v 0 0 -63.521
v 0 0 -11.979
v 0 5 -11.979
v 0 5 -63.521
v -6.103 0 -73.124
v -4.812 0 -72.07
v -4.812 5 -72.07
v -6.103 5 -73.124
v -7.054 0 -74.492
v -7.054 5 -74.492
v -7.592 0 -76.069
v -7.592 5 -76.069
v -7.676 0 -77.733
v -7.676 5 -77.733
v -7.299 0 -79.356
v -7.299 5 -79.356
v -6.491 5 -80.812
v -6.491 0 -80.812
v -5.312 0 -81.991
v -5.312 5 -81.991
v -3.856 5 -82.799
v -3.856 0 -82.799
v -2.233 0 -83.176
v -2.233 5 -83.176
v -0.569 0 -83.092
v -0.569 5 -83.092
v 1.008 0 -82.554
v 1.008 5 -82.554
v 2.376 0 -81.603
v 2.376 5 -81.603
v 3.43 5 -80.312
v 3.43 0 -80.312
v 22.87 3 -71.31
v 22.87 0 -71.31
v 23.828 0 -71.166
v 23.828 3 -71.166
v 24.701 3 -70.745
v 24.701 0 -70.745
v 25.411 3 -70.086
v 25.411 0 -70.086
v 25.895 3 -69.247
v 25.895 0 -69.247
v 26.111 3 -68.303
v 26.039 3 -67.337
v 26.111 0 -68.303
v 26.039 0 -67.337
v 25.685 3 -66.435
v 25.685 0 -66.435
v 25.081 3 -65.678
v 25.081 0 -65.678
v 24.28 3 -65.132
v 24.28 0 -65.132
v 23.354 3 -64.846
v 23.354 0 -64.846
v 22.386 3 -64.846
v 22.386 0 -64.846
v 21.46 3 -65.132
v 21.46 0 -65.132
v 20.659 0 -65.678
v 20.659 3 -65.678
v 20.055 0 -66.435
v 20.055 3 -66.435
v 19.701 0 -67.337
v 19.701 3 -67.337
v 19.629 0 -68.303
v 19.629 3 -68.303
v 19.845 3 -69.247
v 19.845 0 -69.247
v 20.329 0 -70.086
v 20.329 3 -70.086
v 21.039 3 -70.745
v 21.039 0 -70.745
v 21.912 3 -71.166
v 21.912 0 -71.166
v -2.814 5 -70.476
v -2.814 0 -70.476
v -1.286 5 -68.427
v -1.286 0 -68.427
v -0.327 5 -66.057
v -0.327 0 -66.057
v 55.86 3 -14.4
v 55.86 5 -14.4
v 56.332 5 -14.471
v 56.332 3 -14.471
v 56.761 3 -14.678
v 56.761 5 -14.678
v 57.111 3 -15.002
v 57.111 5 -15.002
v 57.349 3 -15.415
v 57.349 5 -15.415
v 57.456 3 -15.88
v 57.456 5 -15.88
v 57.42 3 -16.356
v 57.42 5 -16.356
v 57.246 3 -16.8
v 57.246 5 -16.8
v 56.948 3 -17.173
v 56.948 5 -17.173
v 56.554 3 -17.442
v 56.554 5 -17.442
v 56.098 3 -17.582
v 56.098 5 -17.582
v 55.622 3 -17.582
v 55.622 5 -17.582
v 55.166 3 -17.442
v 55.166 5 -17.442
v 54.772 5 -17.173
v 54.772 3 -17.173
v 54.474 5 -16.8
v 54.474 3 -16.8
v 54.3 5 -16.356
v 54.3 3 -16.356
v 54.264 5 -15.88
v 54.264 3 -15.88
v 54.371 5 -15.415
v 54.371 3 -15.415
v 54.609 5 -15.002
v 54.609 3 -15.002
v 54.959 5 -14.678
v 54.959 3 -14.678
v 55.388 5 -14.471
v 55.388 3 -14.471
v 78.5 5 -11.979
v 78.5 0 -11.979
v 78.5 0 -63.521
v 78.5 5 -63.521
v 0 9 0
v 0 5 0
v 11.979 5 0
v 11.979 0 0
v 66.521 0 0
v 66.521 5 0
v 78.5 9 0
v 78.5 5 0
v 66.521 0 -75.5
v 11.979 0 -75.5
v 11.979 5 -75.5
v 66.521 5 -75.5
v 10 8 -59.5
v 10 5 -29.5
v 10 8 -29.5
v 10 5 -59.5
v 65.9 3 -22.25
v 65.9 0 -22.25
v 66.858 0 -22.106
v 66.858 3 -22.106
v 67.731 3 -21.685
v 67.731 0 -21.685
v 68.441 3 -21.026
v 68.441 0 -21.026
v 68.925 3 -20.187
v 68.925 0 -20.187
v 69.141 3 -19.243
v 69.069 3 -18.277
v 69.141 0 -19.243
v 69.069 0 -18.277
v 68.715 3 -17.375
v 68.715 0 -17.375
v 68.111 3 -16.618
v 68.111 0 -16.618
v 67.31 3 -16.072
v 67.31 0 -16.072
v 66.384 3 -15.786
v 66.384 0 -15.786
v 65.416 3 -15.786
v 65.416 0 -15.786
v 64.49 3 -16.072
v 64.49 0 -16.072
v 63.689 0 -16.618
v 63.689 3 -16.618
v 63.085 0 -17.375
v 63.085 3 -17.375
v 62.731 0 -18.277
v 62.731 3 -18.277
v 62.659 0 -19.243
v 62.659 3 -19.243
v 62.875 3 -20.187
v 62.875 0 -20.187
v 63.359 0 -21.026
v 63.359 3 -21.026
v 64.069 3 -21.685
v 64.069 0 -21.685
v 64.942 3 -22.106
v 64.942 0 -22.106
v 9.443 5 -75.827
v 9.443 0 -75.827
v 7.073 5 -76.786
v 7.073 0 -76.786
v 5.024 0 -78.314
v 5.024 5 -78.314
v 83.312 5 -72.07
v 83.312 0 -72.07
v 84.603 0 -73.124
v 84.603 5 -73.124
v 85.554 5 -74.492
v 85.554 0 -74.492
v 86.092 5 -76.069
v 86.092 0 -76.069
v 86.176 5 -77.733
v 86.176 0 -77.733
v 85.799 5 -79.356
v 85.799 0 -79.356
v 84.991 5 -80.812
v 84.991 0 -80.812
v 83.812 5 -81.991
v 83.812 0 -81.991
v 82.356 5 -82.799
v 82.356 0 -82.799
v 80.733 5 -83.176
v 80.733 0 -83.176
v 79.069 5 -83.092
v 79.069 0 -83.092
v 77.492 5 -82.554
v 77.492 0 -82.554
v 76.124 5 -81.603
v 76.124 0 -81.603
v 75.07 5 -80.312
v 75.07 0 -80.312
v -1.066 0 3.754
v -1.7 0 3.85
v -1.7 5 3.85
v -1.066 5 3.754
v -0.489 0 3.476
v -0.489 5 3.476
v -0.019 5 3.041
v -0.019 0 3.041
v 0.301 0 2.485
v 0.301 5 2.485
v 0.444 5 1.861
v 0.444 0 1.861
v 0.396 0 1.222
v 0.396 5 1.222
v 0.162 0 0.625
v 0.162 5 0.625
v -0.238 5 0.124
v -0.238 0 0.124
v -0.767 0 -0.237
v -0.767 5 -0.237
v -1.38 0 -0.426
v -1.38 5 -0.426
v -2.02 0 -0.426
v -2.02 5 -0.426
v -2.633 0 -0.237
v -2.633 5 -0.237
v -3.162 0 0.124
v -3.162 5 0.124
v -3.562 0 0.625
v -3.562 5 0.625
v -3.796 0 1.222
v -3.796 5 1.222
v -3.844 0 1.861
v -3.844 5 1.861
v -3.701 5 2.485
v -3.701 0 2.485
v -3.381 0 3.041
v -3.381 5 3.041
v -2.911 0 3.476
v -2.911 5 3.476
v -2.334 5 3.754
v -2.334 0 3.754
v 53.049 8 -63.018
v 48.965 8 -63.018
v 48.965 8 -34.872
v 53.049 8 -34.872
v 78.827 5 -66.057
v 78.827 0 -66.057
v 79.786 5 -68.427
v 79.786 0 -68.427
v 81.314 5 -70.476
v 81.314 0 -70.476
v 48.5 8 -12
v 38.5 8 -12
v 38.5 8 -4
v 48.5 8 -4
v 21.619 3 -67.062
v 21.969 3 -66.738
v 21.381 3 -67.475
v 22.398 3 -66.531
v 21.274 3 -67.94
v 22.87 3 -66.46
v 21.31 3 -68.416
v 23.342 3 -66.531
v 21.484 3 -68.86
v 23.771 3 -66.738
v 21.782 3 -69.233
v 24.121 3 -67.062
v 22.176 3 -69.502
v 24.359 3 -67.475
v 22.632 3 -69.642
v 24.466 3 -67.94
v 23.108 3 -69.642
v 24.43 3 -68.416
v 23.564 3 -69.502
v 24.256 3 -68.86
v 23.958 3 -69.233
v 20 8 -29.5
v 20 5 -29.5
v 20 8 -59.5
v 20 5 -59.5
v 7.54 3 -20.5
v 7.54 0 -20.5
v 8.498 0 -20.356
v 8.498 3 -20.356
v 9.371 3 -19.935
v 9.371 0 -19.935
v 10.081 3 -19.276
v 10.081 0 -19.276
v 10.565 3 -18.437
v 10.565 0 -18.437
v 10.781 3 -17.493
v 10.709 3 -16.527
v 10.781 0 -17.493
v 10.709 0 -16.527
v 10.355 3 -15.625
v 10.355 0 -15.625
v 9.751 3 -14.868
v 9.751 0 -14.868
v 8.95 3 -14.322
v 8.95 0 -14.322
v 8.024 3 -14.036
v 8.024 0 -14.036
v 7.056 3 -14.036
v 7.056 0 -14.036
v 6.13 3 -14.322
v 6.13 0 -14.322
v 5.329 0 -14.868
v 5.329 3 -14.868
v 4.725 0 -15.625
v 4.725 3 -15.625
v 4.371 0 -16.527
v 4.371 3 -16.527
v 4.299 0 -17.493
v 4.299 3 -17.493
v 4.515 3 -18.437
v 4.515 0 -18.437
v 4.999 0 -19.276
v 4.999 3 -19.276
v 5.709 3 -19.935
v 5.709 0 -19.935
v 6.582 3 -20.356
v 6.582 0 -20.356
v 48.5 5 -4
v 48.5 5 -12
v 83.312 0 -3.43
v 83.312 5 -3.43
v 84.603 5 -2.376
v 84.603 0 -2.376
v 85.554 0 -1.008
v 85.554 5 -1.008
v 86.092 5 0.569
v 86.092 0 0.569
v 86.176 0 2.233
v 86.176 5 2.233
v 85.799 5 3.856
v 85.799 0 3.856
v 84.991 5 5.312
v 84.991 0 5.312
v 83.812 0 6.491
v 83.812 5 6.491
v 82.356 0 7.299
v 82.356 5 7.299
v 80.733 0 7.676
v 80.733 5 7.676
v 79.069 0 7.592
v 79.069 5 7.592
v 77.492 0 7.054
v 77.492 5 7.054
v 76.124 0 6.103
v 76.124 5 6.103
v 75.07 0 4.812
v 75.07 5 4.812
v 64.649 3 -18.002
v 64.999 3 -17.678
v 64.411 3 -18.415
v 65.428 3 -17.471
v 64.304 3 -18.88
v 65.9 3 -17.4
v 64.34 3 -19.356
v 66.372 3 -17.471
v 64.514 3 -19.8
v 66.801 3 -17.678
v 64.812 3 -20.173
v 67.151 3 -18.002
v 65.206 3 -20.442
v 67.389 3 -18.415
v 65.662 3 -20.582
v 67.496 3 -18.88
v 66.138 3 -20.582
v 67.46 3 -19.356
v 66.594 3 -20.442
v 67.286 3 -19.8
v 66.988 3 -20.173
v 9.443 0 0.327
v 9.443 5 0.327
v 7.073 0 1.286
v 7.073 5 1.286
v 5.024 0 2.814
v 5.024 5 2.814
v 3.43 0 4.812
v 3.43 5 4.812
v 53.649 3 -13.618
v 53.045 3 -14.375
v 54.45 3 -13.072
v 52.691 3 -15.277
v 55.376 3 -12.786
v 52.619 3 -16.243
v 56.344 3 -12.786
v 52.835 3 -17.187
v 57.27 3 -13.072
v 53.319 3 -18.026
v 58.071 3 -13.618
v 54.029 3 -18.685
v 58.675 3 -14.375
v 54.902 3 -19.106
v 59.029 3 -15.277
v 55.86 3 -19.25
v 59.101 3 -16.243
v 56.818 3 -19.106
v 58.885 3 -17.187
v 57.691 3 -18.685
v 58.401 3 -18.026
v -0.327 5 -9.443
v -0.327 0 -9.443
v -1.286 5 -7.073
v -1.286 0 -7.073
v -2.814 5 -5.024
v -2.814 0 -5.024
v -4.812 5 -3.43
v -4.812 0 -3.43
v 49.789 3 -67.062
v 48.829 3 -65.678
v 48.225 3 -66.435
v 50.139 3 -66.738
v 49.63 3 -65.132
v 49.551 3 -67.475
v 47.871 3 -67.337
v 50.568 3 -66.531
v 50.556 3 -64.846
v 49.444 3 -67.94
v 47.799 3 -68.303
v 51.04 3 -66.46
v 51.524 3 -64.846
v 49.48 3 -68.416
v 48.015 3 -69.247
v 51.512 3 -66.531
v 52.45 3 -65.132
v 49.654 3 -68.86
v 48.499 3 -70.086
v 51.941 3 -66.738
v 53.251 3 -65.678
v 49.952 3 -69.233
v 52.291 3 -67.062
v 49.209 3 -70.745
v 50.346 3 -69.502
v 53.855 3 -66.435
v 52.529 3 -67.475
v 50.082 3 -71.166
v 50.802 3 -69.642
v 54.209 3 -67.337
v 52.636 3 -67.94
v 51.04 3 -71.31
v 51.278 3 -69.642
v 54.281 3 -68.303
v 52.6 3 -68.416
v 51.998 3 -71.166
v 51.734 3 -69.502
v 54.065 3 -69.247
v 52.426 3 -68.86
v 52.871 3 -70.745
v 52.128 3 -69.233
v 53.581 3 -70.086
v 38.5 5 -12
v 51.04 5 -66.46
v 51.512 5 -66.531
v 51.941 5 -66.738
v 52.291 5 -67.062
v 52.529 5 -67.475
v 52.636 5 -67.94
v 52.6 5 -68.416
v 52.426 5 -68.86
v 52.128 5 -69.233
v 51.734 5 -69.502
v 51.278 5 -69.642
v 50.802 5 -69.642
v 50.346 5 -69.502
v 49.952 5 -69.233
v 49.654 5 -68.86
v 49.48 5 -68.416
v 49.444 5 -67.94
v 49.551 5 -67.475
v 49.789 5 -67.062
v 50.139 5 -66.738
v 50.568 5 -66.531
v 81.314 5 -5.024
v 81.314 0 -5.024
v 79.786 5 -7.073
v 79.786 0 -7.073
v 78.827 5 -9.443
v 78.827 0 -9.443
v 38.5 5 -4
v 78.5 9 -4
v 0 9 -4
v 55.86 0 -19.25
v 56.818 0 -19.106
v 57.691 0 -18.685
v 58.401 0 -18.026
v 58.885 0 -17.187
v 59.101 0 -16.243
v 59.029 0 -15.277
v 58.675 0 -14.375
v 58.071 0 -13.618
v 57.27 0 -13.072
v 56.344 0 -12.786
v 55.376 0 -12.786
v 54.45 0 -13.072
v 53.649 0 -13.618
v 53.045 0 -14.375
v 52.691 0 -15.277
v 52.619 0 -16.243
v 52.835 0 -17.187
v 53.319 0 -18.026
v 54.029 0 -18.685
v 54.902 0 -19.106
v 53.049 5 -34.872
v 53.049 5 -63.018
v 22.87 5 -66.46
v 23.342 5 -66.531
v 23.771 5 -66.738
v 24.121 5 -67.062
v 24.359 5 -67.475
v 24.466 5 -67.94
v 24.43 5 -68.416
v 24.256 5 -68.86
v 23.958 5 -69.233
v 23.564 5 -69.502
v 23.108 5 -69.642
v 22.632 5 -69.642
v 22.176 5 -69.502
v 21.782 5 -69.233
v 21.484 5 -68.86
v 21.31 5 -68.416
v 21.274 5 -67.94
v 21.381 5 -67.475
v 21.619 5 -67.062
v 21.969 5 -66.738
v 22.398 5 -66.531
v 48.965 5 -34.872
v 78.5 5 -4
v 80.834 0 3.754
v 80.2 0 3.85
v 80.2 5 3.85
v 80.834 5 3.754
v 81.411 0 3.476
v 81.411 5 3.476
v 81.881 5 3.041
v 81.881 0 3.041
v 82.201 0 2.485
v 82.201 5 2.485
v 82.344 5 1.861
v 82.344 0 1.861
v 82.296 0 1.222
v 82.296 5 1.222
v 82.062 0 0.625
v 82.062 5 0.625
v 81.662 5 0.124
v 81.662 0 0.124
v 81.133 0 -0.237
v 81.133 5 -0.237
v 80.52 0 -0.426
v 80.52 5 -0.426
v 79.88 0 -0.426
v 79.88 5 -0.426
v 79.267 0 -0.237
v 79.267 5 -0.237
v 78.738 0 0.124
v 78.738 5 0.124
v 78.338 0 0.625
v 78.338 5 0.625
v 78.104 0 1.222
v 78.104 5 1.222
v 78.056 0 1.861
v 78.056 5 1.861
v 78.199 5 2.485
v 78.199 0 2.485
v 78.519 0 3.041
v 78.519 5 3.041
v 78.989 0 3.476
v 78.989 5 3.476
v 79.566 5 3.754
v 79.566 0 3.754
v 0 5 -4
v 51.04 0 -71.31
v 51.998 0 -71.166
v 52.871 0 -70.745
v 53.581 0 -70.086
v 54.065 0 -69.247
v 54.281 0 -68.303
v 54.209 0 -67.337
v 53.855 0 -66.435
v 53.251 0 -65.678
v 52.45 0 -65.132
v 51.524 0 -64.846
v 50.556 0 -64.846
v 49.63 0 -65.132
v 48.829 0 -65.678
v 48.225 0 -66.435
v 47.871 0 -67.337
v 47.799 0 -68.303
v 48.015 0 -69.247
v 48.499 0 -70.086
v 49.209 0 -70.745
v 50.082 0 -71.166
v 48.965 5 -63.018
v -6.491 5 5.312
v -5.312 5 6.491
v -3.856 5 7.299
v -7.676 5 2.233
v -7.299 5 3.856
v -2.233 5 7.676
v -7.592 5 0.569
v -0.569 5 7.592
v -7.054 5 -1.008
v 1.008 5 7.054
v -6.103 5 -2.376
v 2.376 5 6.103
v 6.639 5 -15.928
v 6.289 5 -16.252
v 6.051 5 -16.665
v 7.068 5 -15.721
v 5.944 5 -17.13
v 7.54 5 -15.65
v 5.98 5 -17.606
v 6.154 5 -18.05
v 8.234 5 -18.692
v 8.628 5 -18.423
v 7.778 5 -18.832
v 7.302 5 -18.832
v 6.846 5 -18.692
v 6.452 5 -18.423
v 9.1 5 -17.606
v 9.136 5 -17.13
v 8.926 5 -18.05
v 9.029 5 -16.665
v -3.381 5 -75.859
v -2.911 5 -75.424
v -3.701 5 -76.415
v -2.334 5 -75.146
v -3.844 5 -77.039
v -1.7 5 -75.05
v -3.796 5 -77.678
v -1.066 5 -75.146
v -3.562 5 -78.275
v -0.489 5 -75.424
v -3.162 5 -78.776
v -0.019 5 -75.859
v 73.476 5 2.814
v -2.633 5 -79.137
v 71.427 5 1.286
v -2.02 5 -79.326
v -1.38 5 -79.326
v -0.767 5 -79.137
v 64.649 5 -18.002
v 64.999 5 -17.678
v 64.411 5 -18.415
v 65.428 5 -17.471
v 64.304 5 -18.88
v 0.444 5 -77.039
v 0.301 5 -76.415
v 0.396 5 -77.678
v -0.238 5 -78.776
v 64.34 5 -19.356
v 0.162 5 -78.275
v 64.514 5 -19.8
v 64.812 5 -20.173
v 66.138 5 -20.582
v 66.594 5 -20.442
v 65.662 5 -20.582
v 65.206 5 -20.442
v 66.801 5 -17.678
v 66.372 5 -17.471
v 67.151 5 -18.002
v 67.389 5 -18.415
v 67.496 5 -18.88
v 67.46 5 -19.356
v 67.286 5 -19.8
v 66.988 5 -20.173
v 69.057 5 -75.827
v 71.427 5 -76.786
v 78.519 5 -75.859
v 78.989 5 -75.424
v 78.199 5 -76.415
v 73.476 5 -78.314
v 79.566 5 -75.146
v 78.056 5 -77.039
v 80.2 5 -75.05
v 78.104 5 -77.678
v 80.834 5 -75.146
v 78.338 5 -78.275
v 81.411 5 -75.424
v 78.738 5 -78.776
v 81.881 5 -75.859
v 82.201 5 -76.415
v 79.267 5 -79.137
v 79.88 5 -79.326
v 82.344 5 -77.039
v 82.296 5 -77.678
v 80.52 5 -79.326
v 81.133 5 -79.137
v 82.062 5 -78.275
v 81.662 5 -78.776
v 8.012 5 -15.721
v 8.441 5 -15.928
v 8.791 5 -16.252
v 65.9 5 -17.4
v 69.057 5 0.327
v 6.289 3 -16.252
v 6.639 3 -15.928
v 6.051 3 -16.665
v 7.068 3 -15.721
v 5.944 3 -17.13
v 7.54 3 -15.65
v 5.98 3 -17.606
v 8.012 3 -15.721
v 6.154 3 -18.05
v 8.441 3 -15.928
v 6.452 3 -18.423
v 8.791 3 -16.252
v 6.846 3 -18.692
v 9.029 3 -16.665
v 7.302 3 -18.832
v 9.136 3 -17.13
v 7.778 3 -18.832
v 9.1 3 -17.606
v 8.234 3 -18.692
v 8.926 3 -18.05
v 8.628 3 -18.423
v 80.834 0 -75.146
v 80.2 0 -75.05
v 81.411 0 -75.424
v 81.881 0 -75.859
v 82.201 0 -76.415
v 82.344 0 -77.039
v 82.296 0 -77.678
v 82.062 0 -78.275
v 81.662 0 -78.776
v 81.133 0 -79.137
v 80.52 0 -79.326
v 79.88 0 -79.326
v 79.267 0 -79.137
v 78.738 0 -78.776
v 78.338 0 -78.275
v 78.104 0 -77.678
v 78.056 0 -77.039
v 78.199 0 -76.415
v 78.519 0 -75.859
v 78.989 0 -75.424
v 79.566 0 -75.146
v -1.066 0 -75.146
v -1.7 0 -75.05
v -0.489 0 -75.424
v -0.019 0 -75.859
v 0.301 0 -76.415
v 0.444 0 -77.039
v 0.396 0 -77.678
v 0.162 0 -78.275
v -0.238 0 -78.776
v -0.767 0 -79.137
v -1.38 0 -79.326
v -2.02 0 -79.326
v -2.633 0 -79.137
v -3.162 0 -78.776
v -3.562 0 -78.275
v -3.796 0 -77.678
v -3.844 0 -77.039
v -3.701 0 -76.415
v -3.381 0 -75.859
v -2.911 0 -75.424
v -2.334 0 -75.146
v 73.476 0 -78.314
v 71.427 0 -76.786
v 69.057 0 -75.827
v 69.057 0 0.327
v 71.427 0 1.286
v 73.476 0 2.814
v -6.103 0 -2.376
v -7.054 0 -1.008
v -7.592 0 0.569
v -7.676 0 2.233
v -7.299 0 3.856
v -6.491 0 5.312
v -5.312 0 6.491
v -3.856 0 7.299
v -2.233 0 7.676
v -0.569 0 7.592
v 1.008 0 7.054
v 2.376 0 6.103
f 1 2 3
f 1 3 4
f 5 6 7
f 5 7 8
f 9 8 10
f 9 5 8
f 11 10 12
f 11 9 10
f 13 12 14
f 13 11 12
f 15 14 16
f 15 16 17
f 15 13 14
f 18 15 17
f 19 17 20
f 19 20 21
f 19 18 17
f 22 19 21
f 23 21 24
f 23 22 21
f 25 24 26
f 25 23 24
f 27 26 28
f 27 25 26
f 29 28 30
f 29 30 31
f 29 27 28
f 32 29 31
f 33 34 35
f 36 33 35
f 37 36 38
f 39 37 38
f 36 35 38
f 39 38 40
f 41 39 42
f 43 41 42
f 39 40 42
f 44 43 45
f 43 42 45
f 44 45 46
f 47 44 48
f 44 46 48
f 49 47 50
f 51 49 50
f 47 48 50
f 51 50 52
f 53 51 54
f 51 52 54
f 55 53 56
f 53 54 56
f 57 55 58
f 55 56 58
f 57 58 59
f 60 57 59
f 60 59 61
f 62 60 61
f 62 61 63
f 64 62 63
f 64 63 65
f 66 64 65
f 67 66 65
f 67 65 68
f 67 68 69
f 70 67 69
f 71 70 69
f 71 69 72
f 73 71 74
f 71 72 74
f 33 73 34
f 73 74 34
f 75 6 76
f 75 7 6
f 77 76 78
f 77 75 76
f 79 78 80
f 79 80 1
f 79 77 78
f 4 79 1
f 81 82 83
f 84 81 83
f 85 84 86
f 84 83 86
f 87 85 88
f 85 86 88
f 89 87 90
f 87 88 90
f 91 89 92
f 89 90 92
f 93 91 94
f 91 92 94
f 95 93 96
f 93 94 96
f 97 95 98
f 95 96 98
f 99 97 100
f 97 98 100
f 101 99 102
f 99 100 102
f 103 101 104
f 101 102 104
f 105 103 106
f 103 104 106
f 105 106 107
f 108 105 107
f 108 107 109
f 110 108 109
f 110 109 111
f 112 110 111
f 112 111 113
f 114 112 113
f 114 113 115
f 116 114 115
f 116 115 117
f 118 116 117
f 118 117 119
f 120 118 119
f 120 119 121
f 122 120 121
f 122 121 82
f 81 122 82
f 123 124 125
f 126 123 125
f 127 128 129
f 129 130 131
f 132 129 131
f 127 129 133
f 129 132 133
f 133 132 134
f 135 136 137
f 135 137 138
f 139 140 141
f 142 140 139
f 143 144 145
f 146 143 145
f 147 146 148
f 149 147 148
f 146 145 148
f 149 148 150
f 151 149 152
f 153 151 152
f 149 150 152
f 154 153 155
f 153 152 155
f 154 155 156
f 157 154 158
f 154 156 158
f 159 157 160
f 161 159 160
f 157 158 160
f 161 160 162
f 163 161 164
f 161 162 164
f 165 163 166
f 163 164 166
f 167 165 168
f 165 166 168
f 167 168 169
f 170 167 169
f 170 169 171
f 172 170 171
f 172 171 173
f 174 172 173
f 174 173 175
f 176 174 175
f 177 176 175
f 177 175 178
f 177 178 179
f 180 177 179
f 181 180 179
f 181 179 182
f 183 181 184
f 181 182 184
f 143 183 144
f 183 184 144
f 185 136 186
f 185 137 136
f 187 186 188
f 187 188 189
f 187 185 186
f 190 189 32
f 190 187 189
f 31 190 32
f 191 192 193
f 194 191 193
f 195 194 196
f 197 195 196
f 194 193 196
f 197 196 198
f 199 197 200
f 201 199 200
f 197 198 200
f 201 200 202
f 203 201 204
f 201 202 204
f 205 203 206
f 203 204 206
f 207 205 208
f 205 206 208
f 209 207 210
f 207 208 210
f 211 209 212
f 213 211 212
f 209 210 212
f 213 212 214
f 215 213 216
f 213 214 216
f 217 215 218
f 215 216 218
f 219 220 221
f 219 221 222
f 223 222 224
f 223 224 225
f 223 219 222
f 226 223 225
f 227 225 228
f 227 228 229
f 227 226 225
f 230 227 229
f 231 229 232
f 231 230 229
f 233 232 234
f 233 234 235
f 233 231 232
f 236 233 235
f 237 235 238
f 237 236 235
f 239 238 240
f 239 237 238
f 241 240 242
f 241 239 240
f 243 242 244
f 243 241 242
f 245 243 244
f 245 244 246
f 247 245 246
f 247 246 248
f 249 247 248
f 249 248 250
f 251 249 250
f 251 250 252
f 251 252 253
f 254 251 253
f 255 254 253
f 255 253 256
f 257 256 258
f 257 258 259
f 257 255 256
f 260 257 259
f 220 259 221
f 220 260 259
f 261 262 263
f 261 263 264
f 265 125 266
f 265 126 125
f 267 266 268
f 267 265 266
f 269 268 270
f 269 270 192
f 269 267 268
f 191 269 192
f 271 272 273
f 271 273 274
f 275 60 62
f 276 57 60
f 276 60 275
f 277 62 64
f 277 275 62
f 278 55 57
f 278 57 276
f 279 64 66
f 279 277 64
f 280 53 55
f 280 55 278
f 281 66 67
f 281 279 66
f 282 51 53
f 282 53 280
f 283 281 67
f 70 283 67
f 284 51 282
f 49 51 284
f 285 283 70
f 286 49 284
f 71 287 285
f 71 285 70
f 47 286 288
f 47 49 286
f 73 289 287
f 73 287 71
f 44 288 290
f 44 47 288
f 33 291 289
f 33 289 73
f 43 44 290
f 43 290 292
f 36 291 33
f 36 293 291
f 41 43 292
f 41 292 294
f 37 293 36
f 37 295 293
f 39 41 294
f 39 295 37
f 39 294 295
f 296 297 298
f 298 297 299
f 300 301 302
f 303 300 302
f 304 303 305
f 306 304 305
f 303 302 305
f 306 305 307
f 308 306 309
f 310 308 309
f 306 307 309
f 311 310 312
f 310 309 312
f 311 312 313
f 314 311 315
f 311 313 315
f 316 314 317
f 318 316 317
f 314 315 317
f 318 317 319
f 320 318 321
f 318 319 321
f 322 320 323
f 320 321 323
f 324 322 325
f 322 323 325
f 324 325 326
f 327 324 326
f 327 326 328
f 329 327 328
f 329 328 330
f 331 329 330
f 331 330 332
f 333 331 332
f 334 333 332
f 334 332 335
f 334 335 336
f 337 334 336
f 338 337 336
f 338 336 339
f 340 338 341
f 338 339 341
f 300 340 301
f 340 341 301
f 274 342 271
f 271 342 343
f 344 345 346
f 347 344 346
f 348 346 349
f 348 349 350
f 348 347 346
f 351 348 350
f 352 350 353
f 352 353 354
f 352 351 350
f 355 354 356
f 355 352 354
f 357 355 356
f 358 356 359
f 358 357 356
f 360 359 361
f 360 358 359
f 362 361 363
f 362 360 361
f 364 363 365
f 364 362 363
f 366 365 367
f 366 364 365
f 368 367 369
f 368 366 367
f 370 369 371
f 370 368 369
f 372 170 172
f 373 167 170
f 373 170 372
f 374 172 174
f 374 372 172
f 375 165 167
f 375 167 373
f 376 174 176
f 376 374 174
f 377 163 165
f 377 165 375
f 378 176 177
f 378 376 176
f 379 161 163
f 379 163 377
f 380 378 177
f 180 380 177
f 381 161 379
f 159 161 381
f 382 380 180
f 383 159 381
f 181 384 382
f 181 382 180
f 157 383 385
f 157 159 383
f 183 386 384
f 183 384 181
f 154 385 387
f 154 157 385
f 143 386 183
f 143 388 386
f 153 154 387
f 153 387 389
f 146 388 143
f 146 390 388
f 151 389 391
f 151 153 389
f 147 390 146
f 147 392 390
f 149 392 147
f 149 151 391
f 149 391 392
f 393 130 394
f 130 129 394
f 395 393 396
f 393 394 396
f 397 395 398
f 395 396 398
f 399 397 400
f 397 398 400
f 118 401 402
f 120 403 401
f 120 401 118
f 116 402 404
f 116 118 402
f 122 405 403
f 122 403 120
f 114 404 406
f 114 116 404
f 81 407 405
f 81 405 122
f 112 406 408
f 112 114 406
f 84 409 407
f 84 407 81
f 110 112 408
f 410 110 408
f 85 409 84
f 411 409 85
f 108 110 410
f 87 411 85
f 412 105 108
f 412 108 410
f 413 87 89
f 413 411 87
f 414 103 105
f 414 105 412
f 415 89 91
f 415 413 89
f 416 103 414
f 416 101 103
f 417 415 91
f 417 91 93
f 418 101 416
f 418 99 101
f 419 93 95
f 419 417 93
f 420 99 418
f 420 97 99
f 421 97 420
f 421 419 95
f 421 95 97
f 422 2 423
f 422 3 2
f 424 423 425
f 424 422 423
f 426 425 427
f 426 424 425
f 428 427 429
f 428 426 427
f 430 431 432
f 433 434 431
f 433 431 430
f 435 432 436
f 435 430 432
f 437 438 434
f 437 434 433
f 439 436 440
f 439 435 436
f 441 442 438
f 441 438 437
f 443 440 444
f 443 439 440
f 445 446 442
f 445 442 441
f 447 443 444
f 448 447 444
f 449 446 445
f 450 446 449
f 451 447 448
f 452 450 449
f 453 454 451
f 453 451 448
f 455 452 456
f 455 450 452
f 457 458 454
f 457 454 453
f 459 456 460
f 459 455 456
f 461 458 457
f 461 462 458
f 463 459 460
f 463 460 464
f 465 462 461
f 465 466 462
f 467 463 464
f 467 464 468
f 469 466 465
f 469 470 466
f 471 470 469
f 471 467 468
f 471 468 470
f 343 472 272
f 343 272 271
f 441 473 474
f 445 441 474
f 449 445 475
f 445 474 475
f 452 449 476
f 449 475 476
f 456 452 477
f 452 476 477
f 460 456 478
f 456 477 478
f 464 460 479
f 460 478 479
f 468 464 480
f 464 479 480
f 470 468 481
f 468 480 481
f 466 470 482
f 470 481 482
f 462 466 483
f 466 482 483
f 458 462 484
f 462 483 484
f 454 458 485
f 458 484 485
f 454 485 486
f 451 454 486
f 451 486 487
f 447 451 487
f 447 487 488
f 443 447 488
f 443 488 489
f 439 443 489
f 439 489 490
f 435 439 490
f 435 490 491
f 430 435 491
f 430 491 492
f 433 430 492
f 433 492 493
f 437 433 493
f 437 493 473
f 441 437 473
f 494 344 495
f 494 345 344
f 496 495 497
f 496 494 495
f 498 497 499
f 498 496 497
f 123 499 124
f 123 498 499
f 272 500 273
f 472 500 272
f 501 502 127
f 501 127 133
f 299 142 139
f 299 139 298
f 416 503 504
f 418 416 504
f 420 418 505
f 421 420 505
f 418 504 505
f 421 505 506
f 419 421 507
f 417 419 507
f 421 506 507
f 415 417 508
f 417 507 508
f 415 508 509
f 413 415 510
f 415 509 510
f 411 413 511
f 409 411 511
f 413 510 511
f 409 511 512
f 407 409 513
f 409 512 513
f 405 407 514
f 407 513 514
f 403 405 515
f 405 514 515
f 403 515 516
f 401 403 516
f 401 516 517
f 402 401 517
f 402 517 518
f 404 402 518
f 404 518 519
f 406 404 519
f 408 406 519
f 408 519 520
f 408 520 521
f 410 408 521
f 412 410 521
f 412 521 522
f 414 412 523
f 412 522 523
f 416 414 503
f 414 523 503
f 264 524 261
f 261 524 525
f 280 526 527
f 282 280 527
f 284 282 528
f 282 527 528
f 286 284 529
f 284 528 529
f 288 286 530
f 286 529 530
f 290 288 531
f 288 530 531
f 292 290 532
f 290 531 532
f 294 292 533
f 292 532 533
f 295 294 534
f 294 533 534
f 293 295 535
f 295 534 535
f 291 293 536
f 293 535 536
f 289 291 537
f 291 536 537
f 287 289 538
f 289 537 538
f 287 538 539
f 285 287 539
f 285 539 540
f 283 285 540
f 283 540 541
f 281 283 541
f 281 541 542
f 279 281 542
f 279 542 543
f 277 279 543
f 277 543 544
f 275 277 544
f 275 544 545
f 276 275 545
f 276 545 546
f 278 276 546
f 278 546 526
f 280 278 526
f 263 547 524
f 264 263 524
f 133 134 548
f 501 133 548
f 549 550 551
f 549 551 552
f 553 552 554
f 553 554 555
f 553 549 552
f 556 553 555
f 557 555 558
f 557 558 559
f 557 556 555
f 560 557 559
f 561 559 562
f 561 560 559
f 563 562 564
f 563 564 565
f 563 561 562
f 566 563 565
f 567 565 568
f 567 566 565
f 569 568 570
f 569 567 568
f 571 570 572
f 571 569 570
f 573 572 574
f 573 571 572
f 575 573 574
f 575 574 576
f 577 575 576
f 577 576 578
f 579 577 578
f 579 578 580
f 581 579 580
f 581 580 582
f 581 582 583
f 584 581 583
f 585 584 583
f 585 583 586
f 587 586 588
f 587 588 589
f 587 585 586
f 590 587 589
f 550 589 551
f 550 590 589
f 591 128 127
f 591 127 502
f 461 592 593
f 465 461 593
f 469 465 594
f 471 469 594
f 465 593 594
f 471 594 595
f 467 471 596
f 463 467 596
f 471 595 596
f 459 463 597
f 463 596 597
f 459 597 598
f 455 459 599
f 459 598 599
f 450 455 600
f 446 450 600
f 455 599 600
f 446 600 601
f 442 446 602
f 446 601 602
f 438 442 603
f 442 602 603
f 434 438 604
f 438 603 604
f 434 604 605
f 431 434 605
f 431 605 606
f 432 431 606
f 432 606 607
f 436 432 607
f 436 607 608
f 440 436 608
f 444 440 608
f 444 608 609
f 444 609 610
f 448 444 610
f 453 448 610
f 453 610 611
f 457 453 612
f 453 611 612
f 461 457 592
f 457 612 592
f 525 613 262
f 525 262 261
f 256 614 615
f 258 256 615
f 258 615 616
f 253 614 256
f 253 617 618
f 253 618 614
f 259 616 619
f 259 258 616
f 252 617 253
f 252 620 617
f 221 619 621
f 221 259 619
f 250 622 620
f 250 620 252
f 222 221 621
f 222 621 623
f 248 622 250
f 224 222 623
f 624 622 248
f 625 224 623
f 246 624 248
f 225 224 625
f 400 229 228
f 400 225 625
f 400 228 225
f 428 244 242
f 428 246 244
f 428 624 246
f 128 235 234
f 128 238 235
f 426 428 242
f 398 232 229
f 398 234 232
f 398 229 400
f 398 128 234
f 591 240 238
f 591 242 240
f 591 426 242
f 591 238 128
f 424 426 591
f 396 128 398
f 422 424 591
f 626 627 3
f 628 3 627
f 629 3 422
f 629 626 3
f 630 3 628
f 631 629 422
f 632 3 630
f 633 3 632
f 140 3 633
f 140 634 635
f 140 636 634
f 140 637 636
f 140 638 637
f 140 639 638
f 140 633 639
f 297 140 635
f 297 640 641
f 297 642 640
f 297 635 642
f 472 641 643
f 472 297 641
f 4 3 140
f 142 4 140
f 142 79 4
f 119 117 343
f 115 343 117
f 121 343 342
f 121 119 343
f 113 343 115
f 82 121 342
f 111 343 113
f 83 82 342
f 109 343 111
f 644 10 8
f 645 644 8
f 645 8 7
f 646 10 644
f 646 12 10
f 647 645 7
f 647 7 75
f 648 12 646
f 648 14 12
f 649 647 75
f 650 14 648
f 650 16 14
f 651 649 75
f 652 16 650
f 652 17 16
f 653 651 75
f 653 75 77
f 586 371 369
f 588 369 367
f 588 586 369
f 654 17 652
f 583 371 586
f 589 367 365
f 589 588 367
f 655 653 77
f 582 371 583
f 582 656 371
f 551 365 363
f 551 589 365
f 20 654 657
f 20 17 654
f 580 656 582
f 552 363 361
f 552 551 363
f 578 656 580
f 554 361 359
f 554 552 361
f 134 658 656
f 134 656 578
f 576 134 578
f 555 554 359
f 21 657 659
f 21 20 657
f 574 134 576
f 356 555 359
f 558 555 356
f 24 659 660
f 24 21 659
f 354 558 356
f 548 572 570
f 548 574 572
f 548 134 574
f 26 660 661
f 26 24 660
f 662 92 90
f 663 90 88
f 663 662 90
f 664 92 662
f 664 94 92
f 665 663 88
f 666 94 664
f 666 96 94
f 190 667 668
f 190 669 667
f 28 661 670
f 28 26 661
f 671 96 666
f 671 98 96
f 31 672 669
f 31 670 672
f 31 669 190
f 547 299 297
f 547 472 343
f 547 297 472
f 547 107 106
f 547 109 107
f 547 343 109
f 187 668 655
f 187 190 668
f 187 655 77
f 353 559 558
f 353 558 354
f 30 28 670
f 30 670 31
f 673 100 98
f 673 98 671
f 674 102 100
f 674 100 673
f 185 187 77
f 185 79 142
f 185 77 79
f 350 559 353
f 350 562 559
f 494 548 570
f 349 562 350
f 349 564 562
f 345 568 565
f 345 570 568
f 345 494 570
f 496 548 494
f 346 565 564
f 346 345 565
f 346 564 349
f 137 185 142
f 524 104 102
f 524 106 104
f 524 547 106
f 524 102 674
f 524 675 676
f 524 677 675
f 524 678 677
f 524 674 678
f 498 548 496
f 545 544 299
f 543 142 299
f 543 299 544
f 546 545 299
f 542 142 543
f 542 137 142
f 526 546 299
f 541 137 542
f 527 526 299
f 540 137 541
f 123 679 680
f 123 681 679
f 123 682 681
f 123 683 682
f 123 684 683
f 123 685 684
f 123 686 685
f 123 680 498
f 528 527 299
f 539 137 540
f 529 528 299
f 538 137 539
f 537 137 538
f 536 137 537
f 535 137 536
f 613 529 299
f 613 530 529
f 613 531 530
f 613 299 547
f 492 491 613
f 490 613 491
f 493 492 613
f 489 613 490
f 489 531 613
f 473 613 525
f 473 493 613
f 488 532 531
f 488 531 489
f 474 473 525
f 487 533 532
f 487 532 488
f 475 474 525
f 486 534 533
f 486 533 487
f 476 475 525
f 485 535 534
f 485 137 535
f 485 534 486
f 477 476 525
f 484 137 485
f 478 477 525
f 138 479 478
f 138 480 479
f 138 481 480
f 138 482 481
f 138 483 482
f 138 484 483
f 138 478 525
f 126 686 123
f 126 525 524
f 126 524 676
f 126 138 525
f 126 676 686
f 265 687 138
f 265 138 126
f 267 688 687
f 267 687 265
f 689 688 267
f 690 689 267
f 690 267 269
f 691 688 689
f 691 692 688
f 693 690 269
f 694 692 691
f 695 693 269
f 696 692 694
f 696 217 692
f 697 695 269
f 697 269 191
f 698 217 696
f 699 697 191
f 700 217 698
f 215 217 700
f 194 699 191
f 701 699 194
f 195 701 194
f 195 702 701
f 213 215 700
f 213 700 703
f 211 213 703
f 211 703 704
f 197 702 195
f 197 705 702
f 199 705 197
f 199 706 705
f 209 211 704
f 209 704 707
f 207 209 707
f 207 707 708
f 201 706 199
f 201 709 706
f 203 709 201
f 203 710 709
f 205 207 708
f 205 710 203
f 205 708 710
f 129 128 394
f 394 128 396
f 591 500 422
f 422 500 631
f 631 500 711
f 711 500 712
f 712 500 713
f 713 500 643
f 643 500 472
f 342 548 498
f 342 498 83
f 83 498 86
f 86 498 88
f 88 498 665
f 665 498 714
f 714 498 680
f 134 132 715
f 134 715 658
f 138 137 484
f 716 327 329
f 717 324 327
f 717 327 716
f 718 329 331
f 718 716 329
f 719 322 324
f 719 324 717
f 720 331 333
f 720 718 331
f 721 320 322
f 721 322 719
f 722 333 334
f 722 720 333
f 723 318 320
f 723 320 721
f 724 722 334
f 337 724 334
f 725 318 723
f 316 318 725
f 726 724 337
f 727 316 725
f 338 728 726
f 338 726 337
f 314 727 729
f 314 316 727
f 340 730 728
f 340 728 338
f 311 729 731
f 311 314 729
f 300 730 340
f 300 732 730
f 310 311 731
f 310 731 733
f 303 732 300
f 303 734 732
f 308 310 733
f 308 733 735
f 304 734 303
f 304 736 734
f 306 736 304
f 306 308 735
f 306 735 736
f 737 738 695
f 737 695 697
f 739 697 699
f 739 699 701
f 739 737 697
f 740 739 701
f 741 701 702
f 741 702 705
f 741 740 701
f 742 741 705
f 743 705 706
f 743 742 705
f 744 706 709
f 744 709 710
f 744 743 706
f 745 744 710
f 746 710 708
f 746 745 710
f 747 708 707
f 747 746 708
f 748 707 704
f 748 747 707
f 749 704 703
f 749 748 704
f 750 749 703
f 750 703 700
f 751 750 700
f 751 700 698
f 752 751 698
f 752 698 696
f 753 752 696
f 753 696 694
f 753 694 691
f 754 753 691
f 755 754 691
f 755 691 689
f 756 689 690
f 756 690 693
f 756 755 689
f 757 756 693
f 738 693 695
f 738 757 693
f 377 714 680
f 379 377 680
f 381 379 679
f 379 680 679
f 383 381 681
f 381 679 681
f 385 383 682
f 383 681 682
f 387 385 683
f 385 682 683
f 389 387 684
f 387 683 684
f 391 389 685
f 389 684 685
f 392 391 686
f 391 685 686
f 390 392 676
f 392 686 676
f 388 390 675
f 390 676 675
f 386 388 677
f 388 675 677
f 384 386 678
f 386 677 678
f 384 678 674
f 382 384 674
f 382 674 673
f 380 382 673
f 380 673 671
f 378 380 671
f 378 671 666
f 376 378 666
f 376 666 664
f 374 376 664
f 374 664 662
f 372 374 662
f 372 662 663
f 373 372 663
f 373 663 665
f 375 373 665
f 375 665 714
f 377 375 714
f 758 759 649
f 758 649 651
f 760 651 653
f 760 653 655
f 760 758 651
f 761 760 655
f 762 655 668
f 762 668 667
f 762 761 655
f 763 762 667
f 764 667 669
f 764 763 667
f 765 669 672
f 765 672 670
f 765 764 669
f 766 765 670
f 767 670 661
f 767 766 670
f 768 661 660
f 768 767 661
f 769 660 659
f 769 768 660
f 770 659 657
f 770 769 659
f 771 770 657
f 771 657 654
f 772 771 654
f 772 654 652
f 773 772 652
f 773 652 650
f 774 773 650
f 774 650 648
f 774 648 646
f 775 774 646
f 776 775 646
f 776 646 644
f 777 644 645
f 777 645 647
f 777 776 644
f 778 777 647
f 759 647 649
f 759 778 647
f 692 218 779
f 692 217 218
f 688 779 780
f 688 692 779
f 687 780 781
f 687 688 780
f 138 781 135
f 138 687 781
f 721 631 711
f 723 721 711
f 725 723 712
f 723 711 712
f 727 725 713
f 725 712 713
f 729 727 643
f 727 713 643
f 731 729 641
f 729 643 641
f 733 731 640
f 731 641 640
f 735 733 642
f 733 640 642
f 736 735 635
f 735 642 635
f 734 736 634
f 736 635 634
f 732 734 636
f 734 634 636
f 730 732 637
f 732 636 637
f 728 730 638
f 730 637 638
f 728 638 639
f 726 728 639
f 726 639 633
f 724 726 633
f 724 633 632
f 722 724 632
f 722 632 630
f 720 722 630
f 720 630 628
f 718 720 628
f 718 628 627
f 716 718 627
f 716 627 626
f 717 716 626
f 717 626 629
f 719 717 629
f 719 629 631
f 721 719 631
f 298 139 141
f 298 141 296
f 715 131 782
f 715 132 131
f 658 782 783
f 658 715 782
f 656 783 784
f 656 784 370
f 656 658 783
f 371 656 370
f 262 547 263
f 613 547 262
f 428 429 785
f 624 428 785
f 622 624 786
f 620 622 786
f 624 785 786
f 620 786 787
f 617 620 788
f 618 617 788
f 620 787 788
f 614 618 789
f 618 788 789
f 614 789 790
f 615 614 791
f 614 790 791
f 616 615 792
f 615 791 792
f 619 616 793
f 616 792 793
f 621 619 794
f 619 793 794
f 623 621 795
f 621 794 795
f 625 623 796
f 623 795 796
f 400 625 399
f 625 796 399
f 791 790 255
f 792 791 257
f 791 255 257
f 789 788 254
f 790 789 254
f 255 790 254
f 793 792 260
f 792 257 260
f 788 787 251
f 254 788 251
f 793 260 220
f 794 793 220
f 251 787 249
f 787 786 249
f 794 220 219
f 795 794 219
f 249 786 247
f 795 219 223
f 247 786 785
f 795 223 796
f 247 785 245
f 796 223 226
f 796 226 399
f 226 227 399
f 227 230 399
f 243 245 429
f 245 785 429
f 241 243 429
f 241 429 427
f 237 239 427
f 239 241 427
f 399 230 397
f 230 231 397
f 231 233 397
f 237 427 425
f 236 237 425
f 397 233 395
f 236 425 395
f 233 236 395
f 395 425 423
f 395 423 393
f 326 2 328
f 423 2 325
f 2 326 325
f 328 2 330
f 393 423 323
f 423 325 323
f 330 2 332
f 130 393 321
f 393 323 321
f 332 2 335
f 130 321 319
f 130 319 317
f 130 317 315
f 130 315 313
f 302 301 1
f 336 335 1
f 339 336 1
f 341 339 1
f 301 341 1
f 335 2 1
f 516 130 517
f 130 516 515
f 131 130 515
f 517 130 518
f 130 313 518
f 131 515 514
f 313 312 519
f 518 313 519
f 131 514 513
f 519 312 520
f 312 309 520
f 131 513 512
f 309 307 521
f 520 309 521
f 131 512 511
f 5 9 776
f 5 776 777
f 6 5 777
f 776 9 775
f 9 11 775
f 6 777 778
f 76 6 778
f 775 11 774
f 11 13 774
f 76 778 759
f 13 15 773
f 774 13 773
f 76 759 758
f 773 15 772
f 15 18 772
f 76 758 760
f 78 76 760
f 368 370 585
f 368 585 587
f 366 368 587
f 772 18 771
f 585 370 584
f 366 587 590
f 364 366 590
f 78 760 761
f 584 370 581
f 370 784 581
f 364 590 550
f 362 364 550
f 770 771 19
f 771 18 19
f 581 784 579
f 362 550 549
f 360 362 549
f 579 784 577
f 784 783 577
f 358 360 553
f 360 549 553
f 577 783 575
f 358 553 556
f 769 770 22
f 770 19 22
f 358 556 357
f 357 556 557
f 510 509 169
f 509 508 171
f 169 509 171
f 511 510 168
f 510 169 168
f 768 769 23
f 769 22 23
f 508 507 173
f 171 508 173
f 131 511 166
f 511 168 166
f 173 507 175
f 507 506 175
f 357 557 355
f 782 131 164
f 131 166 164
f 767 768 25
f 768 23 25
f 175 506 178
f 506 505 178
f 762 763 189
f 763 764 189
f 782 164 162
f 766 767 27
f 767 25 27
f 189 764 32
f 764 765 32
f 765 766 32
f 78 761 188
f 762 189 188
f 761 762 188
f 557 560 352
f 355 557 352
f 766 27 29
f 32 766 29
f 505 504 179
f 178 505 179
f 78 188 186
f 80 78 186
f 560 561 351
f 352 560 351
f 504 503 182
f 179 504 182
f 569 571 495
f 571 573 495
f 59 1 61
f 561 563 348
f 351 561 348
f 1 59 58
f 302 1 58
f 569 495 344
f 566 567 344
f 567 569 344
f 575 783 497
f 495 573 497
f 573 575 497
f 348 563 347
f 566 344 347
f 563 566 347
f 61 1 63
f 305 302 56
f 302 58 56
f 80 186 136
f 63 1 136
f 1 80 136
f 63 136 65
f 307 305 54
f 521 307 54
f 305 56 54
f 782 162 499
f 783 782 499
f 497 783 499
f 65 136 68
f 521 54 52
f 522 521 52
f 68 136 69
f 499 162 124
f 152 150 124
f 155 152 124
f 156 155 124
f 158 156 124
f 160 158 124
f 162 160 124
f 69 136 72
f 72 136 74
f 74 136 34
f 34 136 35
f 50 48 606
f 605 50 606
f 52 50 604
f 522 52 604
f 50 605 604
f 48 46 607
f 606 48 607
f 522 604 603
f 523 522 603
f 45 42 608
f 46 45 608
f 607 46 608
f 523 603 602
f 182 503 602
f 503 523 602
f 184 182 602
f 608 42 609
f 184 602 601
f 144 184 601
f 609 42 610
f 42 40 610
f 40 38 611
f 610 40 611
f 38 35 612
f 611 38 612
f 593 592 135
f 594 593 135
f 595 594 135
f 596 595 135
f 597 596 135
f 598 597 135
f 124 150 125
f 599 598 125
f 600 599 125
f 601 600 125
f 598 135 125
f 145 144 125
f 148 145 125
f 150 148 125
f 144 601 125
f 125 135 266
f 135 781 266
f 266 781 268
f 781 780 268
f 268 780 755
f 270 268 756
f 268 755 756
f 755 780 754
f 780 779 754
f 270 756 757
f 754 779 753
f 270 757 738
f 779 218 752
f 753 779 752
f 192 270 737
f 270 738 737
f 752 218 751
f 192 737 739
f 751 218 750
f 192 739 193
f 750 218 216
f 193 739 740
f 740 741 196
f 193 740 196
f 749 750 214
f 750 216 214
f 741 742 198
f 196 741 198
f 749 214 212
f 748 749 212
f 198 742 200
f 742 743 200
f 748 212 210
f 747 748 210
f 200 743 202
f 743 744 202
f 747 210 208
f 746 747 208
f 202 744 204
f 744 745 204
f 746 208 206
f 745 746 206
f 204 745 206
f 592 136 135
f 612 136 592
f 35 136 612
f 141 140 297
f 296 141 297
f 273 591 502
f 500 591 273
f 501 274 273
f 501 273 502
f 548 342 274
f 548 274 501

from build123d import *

# Parameters (mm, degrees)
SKETCH1_W           = 78.5
SKETCH1_H           = 75.5
BOSS_EXTRUDE1_DEPTH = 5
SKETCH2_W           = 10
SKETCH2_H           = 30
SKETCH2_W_2         = 4.083917928
SKETCH2_H_2         = 28.145920853
SKETCH2_H_3         = 8
BOSS_EXTRUDE2_DEPTH = 3
SKETCH6_R           = 2.15
BOSS_EXTRUDE3_DEPTH = 5
SKETCH3_R           = 1.6
CUT_EXTRUDE3_DEPTH  = 10
SKETCH5_R           = 3.25
CUT_EXTRUDE4_DEPTH  = 3
SKETCH9_W           = 78.5
SKETCH9_H           = 4
BOSS_EXTRUDE5_DEPTH = 4
FILLET2_R           = 10
FILLET3_R           = 10
FILLET4_R           = 10
FILLET5_R           = 10
FILLET6_R           = 10
FILLET7_R           = 10
FILLET8_R           = 10
FILLET9_R           = 10


with BuildPart() as part:
    # Sketch1 → Boss-Extrude1 (new body)
    with BuildSketch(Plane(origin=(0, 0, 0), x_dir=(1, 0, 0), z_dir=(0, 1, 0))):
        with Locations((39.25, 37.75)):
            Rectangle(SKETCH1_W, SKETCH1_H)
    extrude(amount=BOSS_EXTRUDE1_DEPTH)

    # Sketch2 → Boss-Extrude2 (add)
    with BuildSketch(Plane(origin=(0, 5, 0), x_dir=(1, 0, 0), z_dir=(0, 1, 0))):
        with Locations((15, 44.5)):
            Rectangle(SKETCH2_W, SKETCH2_H)
        with Locations((51.006989776, 48.944975154)):
            Rectangle(SKETCH2_W_2, SKETCH2_H_2)
        with Locations((43.5, 8)):
            Rectangle(SKETCH2_W, SKETCH2_H_3)
    extrude(amount=BOSS_EXTRUDE2_DEPTH)

    # Sketch6 → Boss-Extrude3 (add)
    # profile 1 of 4: a face of its own
    with BuildSketch(Plane(origin=(0, 0, 0), x_dir=(1, 0, 0), z_dir=(0, 1, 0))):
        with BuildLine():
            Line((0, 0), (0, 4.054128952))
            ThreePointArc((0, 4.054128952), (-5.942640687, -5.942640687), (4.054128952, 0))
            Line((4.054128952, 0), (0, 0))
        make_face()
        with Locations(Location((-1.7, -1.7, 0), (0, 0, 270))):
            Circle(SKETCH6_R, mode=Mode.SUBTRACT)
    # profile 2 of 4: a face of its own
    with BuildSketch(Plane(origin=(0, 0, 0), x_dir=(1, 0, 0), z_dir=(0, 1, 0))):
        with BuildLine():
            ThreePointArc((78.5, 4.054128952), (84.442640687, -5.942640687), (74.445871048, 0))
            Line((74.445871048, 0), (78.5, 0))
            Line((78.5, 0), (78.5, 4.054128952))
        make_face()
        with Locations(Location((80.2, -1.7, 0), (0, 0, 270))):
            Circle(SKETCH6_R, mode=Mode.SUBTRACT)
    # profile 3 of 4: a face of its own
    with BuildSketch(Plane(origin=(0, 0, 0), x_dir=(1, 0, 0), z_dir=(0, 1, 0))):
        with BuildLine():
            ThreePointArc((0, 71.445871048), (-5.942640687, 81.442640687), (4.054128952, 75.5))
            Line((4.054128952, 75.5), (0, 75.5))
            Line((0, 75.5), (0, 71.445871048))
        make_face()
        with Locations(Location((-1.7, 77.2, 0), (0, 0, 270))):
            Circle(SKETCH6_R, mode=Mode.SUBTRACT)
    # profile 4 of 4: a face of its own
    with BuildSketch(Plane(origin=(0, 0, 0), x_dir=(1, 0, 0), z_dir=(0, 1, 0))):
        with BuildLine():
            Line((78.5, 75.5), (78.5, 71.445871048))
            ThreePointArc((78.5, 71.445871048), (84.442640687, 81.442640687), (74.445871048, 75.5))
            Line((74.445871048, 75.5), (78.5, 75.5))
        make_face()
        with Locations(Location((80.2, 77.2, 0), (0, 0, 270))):
            Circle(SKETCH6_R, mode=Mode.SUBTRACT)
    extrude(amount=BOSS_EXTRUDE3_DEPTH)

    # Sketch3 → Cut-Extrude3 (cut)
    with BuildSketch(Plane(origin=(0, 5, 0), x_dir=(1, 0, 0), z_dir=(0, 1, 0))):
        with Locations(Location((7.54, 17.25, 0), (0, 0, 270))):
            Circle(SKETCH3_R)
        with Locations(Location((55.86, 16, 0), (0, 0, 270))):
            Circle(SKETCH3_R)
        with Locations(Location((22.87, 68.06, 0), (0, 0, 270))):
            Circle(SKETCH3_R)
        with Locations(Location((51.04, 68.06, 0), (0, 0, 270))):
            Circle(SKETCH3_R)
        with Locations(Location((65.9, 19, 0), (0, 0, 270))):
            Circle(SKETCH3_R)
    extrude(amount=-CUT_EXTRUDE3_DEPTH, mode=Mode.SUBTRACT)

    # Sketch5 → Cut-Extrude4 (cut)
    with BuildSketch(Plane.XZ):
        with Locations(Location((7.54, -17.25, 0), (0, 0, 270))):
            Circle(SKETCH5_R)
        with Locations(Location((55.86, -16, 0), (0, 0, 270))):
            Circle(SKETCH5_R)
        with Locations(Location((22.87, -68.06, 0), (0, 0, 270))):
            Circle(SKETCH5_R)
        with Locations(Location((51.04, -68.06, 0), (0, 0, 270))):
            Circle(SKETCH5_R)
        with Locations(Location((65.9, -19, 0), (0, 0, 270))):
            Circle(SKETCH5_R)
    extrude(amount=-CUT_EXTRUDE4_DEPTH, mode=Mode.SUBTRACT)

    # Sketch9 → Boss-Extrude5 (add)
    with BuildSketch(Plane(origin=(0, 5, 0), x_dir=(1, 0, 0), z_dir=(0, 1, 0))):
        with Locations((39.25, 2)):
            Rectangle(SKETCH9_W, SKETCH9_H)
    extrude(amount=BOSS_EXTRUDE5_DEPTH)

    # Fillet2
    fillet2_edges = [part.edges().sort_by_distance(p)[0] for p in [
        (4.054128952, 2.5, 0),
    ]]
    fillet(fillet2_edges, radius=FILLET2_R)

    # Fillet3
    fillet3_edges = [part.edges().sort_by_distance(p)[0] for p in [
        (74.445871048, 2.5, 0),
    ]]
    fillet(fillet3_edges, radius=FILLET3_R)

    # Fillet4
    fillet4_edges = [part.edges().sort_by_distance(p)[0] for p in [
        (78.5, 2.5, -4.054128952),
    ]]
    fillet(fillet4_edges, radius=FILLET4_R)

    # Fillet5
    fillet5_edges = [part.edges().sort_by_distance(p)[0] for p in [
        (78.5, 2.5, -71.445871048),
    ]]
    fillet(fillet5_edges, radius=FILLET5_R)

    # Fillet6
    fillet6_edges = [part.edges().sort_by_distance(p)[0] for p in [
        (74.445871048, 2.5, -75.5),
    ]]
    fillet(fillet6_edges, radius=FILLET6_R)

    # Fillet7
    fillet7_edges = [part.edges().sort_by_distance(p)[0] for p in [
        (4.054128952, 2.5, -75.5),
    ]]
    fillet(fillet7_edges, radius=FILLET7_R)

    # Fillet8
    fillet8_edges = [part.edges().sort_by_distance(p)[0] for p in [
        (0, 2.5, -71.445871048),
    ]]
    fillet(fillet8_edges, radius=FILLET8_R)

    # Fillet9
    fillet9_edges = [part.edges().sort_by_distance(p)[0] for p in [
        (0, 2.5, -4.054128952),
    ]]
    fillet(fillet9_edges, radius=FILLET9_R)


solid = part.part
